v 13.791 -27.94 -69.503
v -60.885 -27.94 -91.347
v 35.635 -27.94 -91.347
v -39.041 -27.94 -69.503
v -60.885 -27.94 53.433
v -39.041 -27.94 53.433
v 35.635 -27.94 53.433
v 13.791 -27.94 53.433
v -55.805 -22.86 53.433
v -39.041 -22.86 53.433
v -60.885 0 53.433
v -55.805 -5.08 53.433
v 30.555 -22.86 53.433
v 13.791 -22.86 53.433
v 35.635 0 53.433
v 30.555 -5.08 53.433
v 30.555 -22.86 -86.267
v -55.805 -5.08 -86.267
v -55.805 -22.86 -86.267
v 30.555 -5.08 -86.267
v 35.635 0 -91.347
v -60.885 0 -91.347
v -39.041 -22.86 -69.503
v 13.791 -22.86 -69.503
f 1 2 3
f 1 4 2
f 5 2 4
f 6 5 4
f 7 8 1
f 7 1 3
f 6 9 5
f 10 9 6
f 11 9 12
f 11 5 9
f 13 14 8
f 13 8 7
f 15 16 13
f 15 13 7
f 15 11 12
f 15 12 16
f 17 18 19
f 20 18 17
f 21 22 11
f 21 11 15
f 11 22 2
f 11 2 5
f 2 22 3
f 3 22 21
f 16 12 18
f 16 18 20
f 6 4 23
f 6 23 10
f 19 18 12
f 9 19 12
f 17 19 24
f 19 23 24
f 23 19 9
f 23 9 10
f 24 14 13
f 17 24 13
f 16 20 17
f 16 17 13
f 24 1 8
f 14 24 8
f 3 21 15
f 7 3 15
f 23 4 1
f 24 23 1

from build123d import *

# Parameters (mm, degrees)
F0_W     = 96.52
F0_H     = 144.78
F1_DEPTH = 27.94
F2_T     = -5.08
F3_W     = 52.832
F3_H     = 122.936
F4_DEPTH = 7.62


with BuildPart() as f1:
    # F0 (on Front) → F1 (new body)
    with BuildSketch(Plane.XZ):
        with Locations((-12.624722, -18.957326)):
            Rectangle(F0_W, F0_H)
    extrude(amount=F1_DEPTH)

    # F2
    f2_openings = [f1.faces().sort_by_distance(p)[0] for p in [
        (-12.624722, -13.97, 53.432674),
    ]]
    offset(amount=F2_T, openings=f2_openings)

    # F3 (on face) → F4 (cut)
    with BuildSketch(Plane.XZ.offset(27.94)):
        with Locations((-12.624722, -8.035326)):
            Rectangle(F3_W, F3_H)
    extrude(amount=-F4_DEPTH, mode=Mode.SUBTRACT)


solid = f1.part
